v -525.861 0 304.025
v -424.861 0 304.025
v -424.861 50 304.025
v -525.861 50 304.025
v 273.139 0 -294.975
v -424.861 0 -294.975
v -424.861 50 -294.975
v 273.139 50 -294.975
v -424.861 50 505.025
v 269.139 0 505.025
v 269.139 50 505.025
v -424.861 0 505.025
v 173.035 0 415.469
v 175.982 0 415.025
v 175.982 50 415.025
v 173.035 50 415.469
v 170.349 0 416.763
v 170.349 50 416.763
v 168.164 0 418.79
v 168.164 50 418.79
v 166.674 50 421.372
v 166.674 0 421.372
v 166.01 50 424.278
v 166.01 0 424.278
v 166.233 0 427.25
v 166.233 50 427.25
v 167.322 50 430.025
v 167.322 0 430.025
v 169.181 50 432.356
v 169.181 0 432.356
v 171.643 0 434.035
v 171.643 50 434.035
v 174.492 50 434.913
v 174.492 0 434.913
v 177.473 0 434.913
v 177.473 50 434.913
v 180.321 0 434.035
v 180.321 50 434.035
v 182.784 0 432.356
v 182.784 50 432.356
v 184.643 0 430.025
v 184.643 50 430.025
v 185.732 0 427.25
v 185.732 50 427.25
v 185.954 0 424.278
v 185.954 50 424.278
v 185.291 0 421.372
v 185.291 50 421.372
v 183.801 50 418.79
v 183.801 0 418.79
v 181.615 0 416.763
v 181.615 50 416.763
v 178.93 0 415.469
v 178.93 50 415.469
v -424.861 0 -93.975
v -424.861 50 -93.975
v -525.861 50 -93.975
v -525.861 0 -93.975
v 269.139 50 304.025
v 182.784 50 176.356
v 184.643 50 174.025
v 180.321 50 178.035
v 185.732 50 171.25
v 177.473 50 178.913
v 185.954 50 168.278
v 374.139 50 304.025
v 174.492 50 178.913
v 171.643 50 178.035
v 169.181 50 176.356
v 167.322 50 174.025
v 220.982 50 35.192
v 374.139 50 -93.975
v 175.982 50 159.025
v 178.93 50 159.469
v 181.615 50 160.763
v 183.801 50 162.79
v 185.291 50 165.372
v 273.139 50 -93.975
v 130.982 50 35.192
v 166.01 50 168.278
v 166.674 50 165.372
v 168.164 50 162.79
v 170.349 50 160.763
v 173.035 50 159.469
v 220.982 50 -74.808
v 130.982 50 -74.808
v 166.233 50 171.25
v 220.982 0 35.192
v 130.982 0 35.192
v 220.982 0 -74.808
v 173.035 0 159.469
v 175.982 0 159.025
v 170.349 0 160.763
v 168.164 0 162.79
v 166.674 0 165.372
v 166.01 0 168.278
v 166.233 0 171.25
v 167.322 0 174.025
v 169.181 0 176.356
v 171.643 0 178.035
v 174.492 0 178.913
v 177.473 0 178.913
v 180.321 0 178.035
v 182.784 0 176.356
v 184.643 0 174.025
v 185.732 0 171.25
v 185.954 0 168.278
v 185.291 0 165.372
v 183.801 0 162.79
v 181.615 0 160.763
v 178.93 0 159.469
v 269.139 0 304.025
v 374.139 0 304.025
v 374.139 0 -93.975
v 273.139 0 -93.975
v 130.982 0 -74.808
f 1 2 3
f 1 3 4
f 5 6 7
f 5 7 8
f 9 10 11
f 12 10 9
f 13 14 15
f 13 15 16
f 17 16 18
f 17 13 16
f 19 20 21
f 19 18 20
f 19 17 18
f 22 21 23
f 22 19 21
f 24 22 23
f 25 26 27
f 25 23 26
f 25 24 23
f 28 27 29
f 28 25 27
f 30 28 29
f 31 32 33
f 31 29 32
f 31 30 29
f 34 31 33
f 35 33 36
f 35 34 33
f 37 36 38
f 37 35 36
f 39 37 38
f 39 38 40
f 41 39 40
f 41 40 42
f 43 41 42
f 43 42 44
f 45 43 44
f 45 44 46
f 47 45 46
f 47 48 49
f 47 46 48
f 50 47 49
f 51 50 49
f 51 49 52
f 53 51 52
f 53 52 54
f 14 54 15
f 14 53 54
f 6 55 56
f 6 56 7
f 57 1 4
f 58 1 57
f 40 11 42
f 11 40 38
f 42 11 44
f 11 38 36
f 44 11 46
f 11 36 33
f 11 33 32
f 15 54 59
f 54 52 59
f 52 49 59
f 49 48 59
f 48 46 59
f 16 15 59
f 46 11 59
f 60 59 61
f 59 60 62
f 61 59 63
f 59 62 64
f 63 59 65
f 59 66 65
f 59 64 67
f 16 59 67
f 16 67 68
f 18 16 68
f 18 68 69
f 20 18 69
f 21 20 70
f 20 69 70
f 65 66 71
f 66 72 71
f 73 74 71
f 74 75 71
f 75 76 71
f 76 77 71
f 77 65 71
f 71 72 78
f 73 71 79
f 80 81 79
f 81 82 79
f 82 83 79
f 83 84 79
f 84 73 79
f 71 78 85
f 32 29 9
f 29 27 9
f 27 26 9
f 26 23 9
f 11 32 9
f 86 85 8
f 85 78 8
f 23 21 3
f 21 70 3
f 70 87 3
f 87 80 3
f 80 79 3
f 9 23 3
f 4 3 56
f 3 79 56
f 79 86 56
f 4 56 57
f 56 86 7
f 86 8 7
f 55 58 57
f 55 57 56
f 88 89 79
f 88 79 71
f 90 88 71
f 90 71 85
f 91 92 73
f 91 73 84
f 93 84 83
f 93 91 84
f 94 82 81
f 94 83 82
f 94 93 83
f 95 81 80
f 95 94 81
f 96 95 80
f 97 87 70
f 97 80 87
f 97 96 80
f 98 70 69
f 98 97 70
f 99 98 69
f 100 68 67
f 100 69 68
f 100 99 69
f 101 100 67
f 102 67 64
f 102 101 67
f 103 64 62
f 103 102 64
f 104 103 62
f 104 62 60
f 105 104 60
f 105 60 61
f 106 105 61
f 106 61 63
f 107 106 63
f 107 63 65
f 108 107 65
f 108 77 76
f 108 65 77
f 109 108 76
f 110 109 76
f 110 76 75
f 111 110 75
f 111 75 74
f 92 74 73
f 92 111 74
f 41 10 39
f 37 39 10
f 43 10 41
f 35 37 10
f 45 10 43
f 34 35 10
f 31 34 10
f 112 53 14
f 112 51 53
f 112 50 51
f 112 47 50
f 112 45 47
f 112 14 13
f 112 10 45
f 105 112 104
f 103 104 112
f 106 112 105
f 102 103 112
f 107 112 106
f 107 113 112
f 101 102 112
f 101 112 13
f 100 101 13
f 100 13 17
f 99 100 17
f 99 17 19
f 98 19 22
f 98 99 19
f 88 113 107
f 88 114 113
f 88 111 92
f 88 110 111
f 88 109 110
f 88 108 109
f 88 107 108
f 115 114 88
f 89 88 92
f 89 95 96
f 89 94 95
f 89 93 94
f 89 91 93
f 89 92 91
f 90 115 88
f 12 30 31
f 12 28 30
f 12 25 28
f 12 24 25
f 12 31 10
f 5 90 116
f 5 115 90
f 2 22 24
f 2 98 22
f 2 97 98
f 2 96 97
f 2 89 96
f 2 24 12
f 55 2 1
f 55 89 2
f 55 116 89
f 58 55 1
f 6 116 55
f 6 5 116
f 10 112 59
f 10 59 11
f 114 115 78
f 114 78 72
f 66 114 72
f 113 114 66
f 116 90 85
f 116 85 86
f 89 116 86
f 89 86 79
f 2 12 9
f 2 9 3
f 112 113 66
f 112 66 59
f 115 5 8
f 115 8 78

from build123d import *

# Parameters (mm, degrees)
BOSS_EXTRUDE1_DEPTH     = 50
CUT_EXTRUDE1_DEPTH      = 731.807873314
CUT_EXTRUDE1_DEPTH_BACK = 731.807873314
SKETCH2_R               = 10
SKETCH2_W               = 90
SKETCH2_H               = 110


with BuildPart() as part:
    # Sketch1 → Boss-Extrude1 (new body)
    with BuildSketch(Plane(origin=(0, 0, 0), x_dir=(1, 0, 0), z_dir=(0, 1, 0))):
        Polygon((-424.861111111, 294.975010995), (273.138888889, 294.975010995), (273.138888889, 93.975010995), (374.138888889, 93.975010995), (374.138888889, -304.024989005), (269.138888889, -304.024989005), (269.138888889, -505.024989005), (-424.861111111, -505.024989005), (-424.861111111, -304.024989005), (-525.861111111, -304.024989005), (-525.861111111, 93.975010995), (-424.861111111, 93.975010995), align=None)
    extrude(amount=BOSS_EXTRUDE1_DEPTH)

    # Sketch2 → Cut-Extrude1 (cut, two sides: drawn at the far end of the back side and taken through both)
    with BuildSketch(Plane(origin=(0, 50, 0), x_dir=(1, 0, 0), z_dir=(0, 1, 0)).offset(-CUT_EXTRUDE1_DEPTH_BACK)):
        with Locations((175.982294355, -425.024989005)):
            Circle(SKETCH2_R)
        with Locations((175.982294355, -169.024989005)):
            Circle(SKETCH2_R)
        with Locations((175.982294355, 19.807706647)):
            Rectangle(SKETCH2_W, SKETCH2_H)
    extrude(amount=CUT_EXTRUDE1_DEPTH + CUT_EXTRUDE1_DEPTH_BACK, mode=Mode.SUBTRACT)


solid = part.part
